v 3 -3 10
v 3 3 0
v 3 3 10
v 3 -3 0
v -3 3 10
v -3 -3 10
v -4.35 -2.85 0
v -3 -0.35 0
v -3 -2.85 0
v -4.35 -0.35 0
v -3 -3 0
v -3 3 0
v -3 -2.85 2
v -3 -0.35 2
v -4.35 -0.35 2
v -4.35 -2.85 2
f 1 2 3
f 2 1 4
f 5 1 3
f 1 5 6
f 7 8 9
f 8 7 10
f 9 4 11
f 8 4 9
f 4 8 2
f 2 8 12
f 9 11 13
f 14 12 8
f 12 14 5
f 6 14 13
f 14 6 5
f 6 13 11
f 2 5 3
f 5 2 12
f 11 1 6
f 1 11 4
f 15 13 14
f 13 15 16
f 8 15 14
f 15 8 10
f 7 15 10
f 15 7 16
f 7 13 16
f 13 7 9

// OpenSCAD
translate([0, 0, 5]) color([0,1,0,0.9]) cube([6, 6, 10], center=true);
translate([-0.6, -0.6, 1]) color([1,0,0]) cube([0.5, 0.5, 2], center=true);
translate([-1.1, -0.6, 1]) color([1,0,0]) cube([0.5, 0.5, 2], center=true);
translate([-1.6, -0.6, 1]) color([1,0,0]) cube([0.5, 0.5, 2], center=true);
translate([-2.1, -0.6, 1]) color([1,0,0]) cube([0.5, 0.5, 2], center=true);
translate([-2.6, -0.6, 1]) color([1,0,0]) cube([0.5, 0.5, 2], center=true);
translate([-3.1, -0.6, 1]) color([1,0,0]) cube([0.5, 0.5, 2], center=true);
translate([-3.6, -0.6, 1]) color([1,0,0]) cube([0.5, 0.5, 2], center=true);
translate([-4.1, -0.6, 1]) color([1,0,0]) cube([0.5, 0.5, 2], center=true);
translate([-0.6, -1.1, 1]) color([1,0,0]) cube([0.5, 0.5, 2], center=true);
translate([-1.1, -1.1, 1]) color([1,0,0]) cube([0.5, 0.5, 2], center=true);
translate([-1.6, -1.1, 1]) color([1,0,0]) cube([0.5, 0.5, 2], center=true);
translate([-2.1, -1.1, 1]) color([1,0,0]) cube([0.5, 0.5, 2], center=true);
translate([-2.6, -1.1, 1]) color([1,0,0]) cube([0.5, 0.5, 2], center=true);
translate([-3.1, -1.1, 1]) color([1,0,0]) cube([0.5, 0.5, 2], center=true);
translate([-3.6, -1.1, 1]) color([1,0,0]) cube([0.5, 0.5, 2], center=true);
translate([-4.1, -1.1, 1]) color([1,0,0]) cube([0.5, 0.5, 2], center=true);
translate([-0.6, -1.6, 1]) color([1,0,0]) cube([0.5, 0.5, 2], center=true);
translate([-1.1, -1.6, 1]) color([1,0,0]) cube([0.5, 0.5, 2], center=true);
translate([-1.6, -1.6, 1]) color([1,0,0]) cube([0.5, 0.5, 2], center=true);
translate([-2.1, -1.6, 1]) color([1,0,0]) cube([0.5, 0.5, 2], center=true);
translate([-2.6, -1.6, 1]) color([1,0,0]) cube([0.5, 0.5, 2], center=true);
translate([-3.1, -1.6, 1]) color([1,0,0]) cube([0.5, 0.5, 2], center=true);
translate([-3.6, -1.6, 1]) color([1,0,0]) cube([0.5, 0.5, 2], center=true);
translate([-4.1, -1.6, 1]) color([1,0,0]) cube([0.5, 0.5, 2], center=true);
translate([-0.6, -2.1, 1]) color([1,0,0]) cube([0.5, 0.5, 2], center=true);
translate([-1.1, -2.1, 1]) color([1,0,0]) cube([0.5, 0.5, 2], center=true);
translate([-1.6, -2.1, 1]) color([1,0,0]) cube([0.5, 0.5, 2], center=true);
translate([-2.1, -2.1, 1]) color([1,0,0]) cube([0.5, 0.5, 2], center=true);
translate([-2.6, -2.1, 1]) color([1,0,0]) cube([0.5, 0.5, 2], center=true);
translate([-3.1, -2.1, 1]) color([1,0,0]) cube([0.5, 0.5, 2], center=true);
translate([-3.6, -2.1, 1]) color([1,0,0]) cube([0.5, 0.5, 2], center=true);
translate([-4.1, -2.1, 1]) color([1,0,0]) cube([0.5, 0.5, 2], center=true);
translate([-0.6, -2.6, 1]) color([1,0,0]) cube([0.5, 0.5, 2], center=true);
translate([-1.1, -2.6, 1]) color([1,0,0]) cube([0.5, 0.5, 2], center=true);
translate([-1.6, -2.6, 1]) color([1,0,0]) cube([0.5, 0.5, 2], center=true);
translate([-2.1, -2.6, 1]) color([1,0,0]) cube([0.5, 0.5, 2], center=true);
translate([-2.6, -2.6, 1]) color([1,0,0]) cube([0.5, 0.5, 2], center=true);
translate([-3.1, -2.6, 1]) color([1,0,0]) cube([0.5, 0.5, 2], center=true);
translate([-3.6, -2.6, 1]) color([1,0,0]) cube([0.5, 0.5, 2], center=true);
translate([-4.1, -2.6, 1]) color([1,0,0]) cube([0.5, 0.5, 2], center=true);
